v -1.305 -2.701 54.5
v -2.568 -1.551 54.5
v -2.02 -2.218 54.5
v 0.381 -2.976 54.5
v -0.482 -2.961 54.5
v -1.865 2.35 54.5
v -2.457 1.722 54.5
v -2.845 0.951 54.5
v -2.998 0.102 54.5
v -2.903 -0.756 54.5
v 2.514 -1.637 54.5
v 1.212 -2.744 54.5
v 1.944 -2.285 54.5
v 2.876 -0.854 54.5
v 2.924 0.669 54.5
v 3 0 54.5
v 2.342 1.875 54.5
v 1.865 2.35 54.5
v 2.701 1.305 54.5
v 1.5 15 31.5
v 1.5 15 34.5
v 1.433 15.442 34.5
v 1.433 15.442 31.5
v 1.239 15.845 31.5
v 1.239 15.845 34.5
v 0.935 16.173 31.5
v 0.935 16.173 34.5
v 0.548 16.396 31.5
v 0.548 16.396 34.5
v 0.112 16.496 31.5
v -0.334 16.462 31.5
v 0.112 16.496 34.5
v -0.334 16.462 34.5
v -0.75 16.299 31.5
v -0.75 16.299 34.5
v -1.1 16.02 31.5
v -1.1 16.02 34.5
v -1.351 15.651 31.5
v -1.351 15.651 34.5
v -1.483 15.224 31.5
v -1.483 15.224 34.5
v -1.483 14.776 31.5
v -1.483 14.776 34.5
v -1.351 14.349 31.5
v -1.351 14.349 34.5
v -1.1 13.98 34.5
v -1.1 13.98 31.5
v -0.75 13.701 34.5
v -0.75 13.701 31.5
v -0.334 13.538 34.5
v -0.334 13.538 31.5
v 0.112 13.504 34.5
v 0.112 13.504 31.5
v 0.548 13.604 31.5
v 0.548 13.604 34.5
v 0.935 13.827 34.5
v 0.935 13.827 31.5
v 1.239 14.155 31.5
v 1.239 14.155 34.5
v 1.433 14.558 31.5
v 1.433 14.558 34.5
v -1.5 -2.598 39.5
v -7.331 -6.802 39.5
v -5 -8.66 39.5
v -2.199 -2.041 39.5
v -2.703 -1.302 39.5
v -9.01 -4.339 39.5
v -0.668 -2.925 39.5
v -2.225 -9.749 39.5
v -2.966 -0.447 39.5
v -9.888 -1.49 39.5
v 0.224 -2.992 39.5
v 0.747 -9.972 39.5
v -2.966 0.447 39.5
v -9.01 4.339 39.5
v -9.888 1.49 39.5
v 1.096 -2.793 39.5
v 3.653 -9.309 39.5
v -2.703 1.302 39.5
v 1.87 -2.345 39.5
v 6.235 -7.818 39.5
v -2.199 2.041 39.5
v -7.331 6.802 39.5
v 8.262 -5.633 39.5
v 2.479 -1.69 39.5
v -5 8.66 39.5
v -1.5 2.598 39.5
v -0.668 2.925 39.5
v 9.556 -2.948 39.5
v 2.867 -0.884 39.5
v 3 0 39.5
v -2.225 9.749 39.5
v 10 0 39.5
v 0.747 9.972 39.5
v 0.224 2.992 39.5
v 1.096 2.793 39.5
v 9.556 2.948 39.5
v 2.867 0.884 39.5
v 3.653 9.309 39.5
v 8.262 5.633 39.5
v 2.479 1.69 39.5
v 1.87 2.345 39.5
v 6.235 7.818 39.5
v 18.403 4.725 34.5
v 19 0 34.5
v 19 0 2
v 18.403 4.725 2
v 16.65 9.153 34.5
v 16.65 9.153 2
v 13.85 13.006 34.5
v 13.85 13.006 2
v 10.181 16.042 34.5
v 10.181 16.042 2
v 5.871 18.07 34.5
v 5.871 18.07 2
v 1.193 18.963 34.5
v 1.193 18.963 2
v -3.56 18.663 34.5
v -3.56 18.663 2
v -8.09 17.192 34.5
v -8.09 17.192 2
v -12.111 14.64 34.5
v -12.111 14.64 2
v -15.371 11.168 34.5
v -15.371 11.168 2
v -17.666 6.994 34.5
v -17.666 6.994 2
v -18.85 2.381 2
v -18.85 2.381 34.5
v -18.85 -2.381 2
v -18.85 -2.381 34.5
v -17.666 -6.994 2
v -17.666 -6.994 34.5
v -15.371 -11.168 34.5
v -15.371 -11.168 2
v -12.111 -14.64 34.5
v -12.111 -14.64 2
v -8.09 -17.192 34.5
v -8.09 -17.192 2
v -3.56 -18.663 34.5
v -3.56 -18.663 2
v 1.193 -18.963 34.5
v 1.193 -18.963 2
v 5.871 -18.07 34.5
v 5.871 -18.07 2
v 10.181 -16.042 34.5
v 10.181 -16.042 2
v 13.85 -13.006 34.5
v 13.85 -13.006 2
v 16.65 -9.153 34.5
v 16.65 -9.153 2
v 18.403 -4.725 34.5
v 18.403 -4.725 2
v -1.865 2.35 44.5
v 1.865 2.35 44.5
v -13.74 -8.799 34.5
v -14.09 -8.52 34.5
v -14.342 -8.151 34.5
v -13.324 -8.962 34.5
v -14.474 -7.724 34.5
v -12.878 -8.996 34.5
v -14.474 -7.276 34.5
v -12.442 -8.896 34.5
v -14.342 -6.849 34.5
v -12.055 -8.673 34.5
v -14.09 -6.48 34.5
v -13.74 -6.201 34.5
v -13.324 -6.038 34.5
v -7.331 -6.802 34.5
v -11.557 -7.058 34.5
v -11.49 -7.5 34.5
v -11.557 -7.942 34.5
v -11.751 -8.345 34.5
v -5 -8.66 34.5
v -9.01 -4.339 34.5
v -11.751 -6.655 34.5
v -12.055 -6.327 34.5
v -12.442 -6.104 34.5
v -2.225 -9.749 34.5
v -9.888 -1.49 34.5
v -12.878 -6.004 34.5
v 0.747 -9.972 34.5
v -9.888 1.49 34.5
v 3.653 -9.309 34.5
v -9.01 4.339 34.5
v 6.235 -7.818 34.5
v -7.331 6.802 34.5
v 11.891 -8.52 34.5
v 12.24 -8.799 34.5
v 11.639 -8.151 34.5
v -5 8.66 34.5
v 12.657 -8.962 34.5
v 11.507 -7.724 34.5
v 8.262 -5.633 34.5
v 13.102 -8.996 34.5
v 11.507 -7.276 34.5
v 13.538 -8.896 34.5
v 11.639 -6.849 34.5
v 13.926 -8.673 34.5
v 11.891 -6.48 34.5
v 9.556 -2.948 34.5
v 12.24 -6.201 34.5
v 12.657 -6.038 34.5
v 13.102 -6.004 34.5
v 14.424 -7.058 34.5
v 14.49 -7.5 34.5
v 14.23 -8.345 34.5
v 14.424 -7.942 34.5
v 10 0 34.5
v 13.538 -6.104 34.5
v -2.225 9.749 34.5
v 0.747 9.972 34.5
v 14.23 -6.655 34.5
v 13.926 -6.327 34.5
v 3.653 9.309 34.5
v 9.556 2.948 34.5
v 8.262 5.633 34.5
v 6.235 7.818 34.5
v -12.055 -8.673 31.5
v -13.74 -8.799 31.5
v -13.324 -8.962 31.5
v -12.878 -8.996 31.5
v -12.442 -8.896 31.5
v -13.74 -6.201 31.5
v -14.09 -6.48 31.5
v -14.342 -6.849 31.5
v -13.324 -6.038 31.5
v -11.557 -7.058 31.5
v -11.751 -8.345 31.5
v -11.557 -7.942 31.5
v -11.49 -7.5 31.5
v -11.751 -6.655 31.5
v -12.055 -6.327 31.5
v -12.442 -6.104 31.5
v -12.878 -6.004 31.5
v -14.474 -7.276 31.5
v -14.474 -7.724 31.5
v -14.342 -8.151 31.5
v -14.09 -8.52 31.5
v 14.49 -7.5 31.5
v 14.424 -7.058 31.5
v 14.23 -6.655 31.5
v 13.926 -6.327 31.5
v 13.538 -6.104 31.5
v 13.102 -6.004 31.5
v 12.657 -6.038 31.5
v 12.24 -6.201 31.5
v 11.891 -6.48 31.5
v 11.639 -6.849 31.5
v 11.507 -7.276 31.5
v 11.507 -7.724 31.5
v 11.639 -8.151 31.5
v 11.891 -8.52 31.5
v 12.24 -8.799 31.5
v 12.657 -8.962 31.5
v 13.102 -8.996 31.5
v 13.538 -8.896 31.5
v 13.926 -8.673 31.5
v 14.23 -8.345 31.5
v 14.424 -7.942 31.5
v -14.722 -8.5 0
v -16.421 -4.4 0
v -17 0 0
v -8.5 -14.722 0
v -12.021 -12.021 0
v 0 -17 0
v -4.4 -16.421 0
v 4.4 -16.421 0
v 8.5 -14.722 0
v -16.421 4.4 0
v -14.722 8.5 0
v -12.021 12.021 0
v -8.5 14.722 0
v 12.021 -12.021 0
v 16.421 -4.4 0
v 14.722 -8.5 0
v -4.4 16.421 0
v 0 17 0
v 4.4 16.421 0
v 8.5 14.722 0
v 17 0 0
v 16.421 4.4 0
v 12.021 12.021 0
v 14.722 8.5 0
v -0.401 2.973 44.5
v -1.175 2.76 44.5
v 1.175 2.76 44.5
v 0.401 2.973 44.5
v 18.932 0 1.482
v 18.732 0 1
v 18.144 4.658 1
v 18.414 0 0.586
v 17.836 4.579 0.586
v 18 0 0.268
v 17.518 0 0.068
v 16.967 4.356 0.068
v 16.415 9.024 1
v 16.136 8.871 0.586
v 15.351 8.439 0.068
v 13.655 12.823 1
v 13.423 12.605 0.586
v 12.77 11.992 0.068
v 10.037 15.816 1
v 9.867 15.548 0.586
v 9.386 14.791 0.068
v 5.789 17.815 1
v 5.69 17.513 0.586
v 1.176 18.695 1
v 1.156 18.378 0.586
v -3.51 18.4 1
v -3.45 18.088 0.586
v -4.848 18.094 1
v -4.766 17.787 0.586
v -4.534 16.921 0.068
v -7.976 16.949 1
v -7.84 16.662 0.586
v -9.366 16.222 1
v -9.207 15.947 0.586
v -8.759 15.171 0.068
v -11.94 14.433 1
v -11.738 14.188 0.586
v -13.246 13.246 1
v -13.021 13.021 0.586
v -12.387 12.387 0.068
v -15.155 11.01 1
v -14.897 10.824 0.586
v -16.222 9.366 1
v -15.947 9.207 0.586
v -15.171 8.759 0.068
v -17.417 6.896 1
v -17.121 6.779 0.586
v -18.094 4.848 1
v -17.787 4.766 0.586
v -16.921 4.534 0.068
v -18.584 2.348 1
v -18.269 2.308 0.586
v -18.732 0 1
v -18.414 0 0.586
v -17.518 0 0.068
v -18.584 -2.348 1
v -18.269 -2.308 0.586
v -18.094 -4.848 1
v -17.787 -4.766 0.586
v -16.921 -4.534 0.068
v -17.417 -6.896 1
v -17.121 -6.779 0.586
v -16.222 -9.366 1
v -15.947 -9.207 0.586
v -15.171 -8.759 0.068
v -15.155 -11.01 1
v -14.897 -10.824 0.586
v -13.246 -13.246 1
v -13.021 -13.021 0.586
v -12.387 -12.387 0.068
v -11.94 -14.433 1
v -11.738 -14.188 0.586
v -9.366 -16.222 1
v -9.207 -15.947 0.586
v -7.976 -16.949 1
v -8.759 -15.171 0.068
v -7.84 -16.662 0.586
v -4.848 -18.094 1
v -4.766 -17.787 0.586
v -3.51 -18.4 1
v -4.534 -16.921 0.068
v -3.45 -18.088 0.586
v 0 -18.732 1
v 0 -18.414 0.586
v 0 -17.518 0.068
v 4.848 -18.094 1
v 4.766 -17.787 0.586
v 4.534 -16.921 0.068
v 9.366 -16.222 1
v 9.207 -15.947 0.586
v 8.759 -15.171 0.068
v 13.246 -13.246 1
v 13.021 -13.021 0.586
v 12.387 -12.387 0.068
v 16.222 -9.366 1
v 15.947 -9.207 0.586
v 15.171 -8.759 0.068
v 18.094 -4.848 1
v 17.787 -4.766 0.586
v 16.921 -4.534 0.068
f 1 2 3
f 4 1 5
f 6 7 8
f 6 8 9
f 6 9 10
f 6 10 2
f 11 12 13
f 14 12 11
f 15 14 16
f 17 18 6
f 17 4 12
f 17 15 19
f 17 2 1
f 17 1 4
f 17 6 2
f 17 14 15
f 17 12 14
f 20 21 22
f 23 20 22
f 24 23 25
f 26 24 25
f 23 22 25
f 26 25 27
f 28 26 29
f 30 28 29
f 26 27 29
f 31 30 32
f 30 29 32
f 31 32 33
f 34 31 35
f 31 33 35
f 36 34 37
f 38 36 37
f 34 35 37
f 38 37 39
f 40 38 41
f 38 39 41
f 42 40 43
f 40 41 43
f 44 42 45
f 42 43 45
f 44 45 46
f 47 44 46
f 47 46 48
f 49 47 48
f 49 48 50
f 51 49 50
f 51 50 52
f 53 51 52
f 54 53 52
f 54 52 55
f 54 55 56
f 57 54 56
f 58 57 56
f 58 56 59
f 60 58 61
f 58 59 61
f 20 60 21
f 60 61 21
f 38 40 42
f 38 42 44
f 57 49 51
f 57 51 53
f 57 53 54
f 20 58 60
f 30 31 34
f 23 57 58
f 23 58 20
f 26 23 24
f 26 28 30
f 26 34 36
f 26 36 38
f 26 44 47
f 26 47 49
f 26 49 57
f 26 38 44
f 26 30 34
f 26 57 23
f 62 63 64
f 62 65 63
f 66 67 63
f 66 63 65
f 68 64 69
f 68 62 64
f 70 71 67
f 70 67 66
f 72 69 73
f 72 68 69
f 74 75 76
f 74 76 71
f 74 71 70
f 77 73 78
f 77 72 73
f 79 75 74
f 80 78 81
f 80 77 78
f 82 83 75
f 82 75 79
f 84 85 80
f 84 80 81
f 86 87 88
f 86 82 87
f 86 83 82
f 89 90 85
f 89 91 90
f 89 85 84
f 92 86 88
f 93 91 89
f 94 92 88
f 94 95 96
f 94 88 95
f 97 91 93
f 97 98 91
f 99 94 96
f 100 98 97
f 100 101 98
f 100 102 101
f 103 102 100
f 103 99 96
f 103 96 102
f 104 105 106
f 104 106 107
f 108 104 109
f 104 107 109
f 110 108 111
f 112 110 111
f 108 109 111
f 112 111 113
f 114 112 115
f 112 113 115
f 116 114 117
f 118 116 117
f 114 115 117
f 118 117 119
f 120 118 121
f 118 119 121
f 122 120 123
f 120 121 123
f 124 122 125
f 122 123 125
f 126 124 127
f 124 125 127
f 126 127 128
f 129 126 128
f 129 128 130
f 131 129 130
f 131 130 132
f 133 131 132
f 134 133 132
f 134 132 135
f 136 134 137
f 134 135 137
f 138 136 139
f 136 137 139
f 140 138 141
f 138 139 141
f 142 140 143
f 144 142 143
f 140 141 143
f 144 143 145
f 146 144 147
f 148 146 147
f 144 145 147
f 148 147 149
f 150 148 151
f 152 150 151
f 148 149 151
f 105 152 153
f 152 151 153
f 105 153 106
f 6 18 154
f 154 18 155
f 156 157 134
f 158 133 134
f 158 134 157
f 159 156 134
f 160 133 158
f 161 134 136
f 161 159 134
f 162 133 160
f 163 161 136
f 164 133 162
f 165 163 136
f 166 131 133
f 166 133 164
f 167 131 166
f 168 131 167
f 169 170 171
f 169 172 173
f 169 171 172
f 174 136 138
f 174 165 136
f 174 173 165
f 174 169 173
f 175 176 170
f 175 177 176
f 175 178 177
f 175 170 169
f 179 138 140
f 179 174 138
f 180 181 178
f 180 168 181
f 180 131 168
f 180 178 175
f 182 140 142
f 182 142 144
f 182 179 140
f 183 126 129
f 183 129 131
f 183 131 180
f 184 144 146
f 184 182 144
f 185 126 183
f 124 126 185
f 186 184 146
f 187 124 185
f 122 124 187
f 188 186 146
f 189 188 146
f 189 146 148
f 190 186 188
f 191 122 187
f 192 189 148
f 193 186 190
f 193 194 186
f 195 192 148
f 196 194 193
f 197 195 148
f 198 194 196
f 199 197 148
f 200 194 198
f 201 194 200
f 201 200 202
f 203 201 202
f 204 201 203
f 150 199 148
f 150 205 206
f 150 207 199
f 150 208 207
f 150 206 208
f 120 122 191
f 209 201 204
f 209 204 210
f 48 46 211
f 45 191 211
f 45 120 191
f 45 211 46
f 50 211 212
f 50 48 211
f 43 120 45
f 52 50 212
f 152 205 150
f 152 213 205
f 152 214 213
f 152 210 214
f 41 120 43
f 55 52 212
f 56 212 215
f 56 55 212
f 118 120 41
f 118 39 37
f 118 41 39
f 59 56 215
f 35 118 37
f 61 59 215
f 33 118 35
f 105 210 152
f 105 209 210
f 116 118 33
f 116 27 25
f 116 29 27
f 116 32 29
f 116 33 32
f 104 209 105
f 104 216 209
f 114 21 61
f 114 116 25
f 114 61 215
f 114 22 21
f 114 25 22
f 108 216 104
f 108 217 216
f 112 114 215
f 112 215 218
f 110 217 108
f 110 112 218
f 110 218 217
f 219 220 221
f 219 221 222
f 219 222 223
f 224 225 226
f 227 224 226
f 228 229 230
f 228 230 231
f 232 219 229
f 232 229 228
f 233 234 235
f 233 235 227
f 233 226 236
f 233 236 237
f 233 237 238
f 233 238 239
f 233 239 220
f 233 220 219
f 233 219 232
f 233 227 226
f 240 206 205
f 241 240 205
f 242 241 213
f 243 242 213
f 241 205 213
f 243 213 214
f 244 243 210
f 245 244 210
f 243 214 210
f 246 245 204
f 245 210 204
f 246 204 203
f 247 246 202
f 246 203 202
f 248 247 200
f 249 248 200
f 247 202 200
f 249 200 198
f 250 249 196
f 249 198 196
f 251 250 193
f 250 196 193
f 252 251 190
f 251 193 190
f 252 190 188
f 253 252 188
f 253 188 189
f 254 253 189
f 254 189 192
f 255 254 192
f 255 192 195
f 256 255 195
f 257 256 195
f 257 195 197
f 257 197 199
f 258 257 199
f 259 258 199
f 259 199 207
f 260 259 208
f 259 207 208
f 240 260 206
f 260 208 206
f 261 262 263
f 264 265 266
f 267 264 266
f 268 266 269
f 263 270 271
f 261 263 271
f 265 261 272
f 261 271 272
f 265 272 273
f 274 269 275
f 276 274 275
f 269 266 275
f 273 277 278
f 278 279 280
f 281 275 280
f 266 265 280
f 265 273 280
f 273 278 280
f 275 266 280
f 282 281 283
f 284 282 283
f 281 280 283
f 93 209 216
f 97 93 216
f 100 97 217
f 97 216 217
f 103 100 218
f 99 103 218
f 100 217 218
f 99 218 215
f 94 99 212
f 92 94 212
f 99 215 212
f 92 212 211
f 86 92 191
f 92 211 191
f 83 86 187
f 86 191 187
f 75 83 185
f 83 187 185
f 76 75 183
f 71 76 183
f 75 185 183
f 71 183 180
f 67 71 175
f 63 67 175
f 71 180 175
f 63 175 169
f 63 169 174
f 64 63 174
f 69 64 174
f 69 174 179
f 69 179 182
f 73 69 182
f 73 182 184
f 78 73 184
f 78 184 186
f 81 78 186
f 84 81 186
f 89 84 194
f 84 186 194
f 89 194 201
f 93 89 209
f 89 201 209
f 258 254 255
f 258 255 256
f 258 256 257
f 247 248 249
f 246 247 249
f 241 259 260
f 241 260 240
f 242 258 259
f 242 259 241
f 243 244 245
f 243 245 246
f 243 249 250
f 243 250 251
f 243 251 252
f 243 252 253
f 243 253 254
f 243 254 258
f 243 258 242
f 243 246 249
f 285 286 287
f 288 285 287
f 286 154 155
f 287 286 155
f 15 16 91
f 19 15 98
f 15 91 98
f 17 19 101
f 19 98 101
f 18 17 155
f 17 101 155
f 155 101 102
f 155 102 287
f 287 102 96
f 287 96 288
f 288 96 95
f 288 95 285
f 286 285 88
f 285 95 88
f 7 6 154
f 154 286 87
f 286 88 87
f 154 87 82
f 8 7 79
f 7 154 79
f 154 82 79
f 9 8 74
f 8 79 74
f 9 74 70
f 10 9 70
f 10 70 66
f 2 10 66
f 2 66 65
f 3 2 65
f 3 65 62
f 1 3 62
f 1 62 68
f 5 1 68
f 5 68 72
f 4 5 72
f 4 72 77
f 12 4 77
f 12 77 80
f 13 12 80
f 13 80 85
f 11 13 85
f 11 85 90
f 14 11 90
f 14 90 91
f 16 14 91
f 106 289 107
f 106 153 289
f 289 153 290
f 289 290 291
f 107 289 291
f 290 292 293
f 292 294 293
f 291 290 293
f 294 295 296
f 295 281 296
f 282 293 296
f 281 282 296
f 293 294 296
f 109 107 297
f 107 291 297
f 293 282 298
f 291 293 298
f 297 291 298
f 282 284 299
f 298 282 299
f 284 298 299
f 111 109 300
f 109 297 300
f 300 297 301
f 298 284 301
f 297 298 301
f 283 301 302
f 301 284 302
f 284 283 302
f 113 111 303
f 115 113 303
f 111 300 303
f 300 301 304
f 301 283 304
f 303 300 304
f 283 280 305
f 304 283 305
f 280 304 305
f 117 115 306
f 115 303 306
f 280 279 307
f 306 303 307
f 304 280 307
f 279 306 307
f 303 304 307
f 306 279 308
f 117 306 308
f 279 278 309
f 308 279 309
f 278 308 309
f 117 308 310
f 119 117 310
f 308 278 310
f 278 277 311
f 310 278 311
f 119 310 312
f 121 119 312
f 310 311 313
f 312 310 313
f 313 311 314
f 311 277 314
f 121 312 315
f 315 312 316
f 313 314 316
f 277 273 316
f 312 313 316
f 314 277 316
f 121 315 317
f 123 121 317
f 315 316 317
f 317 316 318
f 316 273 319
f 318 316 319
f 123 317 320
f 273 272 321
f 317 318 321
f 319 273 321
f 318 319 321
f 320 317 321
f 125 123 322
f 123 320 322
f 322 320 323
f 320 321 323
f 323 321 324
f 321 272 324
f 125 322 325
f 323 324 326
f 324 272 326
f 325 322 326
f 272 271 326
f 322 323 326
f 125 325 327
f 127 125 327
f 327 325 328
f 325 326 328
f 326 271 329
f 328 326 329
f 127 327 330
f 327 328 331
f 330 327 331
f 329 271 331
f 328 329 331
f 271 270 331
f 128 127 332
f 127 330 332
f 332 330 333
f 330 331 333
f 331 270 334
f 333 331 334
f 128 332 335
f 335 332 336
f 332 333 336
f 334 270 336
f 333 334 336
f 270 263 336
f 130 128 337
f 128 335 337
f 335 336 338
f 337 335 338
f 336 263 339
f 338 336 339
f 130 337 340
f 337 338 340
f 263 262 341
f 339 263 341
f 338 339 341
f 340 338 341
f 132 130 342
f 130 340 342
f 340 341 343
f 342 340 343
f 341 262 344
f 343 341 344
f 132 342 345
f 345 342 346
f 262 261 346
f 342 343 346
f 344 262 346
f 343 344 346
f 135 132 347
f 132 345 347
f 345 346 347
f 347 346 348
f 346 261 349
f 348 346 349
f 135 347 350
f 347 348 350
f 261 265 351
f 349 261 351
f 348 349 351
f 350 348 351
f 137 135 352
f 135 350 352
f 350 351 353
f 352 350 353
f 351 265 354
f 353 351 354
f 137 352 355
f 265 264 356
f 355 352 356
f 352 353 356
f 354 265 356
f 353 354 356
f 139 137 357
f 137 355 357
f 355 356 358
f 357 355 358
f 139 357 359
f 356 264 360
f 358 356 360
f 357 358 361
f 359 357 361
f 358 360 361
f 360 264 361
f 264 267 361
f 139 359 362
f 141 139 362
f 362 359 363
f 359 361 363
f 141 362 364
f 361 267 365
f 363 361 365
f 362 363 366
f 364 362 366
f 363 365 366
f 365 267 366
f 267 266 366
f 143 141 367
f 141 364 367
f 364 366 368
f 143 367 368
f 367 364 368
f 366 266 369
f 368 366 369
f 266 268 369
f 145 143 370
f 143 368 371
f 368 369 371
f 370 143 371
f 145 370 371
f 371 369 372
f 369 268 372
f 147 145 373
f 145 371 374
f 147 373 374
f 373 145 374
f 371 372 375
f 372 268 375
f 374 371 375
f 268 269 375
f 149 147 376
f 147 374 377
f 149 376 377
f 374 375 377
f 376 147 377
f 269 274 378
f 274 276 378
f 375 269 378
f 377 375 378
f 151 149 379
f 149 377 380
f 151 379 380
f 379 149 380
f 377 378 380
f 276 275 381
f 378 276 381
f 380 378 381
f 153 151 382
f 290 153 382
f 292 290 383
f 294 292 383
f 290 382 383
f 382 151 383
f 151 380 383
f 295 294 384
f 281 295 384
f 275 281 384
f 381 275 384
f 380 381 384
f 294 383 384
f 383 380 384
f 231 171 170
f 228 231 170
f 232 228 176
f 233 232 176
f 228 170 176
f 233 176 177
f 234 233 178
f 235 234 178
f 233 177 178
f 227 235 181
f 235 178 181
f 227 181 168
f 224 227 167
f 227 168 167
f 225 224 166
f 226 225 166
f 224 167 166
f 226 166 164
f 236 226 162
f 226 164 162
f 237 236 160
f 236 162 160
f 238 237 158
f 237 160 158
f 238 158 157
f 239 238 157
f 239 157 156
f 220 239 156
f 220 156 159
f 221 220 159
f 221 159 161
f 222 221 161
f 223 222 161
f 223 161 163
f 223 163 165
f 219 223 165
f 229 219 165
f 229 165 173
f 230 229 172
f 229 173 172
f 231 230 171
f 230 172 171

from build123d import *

# Parameters (mm, degrees)
SKETCH1_R               = 19
BOSS_EXTRUDE1_DEPTH     = 34.5
SKETCH2_R               = 10
BOSS_EXTRUDE2_DEPTH     = 5
SKETCH3_R               = 3
BOSS_EXTRUDE3_DEPTH     = 15
SKETCH4_W               = 10
SKETCH4_H               = 0.65
CUT_EXTRUDE1_DEPTH      = 20
CUT_EXTRUDE1_DEPTH_BACK = 20
FILLET1_R               = 2
SKETCH5_R               = 1.5
CUT_EXTRUDE2_DEPTH      = 3


with BuildPart() as part:
    # Sketch1 → Boss-Extrude1 (new body)
    with BuildSketch(Plane.XY):
        Circle(SKETCH1_R)
    extrude(amount=BOSS_EXTRUDE1_DEPTH)

    # Sketch2 → Boss-Extrude2 (add)
    with BuildSketch(Plane.XY.offset(34.5)):
        Circle(SKETCH2_R)
    extrude(amount=BOSS_EXTRUDE2_DEPTH)

    # Sketch3 → Boss-Extrude3 (add)
    with BuildSketch(Plane.XY.offset(39.5)):
        Circle(SKETCH3_R)
    extrude(amount=BOSS_EXTRUDE3_DEPTH)

    # Sketch4 → Cut-Extrude1 (cut, two sides)
    with BuildSketch(Plane(origin=(0, 0, 0), x_dir=(0, 0, -1), z_dir=(1, 0, 0))) as cut_extrude1_sk:
        with Locations((-49.5, 2.675)):
            Rectangle(SKETCH4_W, SKETCH4_H)
    extrude(amount=CUT_EXTRUDE1_DEPTH, mode=Mode.SUBTRACT)
    extrude(cut_extrude1_sk.sketch, amount=-CUT_EXTRUDE1_DEPTH_BACK, mode=Mode.SUBTRACT)

    # Fillet1
    fillet1_edges = [part.edges().sort_by_distance(p)[0] for p in [
        (-19, 0, 0),
    ]]
    fillet(fillet1_edges, radius=FILLET1_R)

    # Sketch5 → Cut-Extrude2 (cut)
    with BuildSketch(Plane.XY.offset(34.5)):
        with Locations((0, 15)):
            Circle(SKETCH5_R)
        with Locations((12.990381057, -7.5)):
            Circle(SKETCH5_R)
        with Locations((-12.990381057, -7.5)):
            Circle(SKETCH5_R)
    extrude(amount=-CUT_EXTRUDE2_DEPTH, mode=Mode.SUBTRACT)


solid = part.part
